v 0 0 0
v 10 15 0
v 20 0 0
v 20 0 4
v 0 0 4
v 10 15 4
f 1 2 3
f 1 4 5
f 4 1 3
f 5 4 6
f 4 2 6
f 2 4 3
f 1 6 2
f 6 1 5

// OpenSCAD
$fn = 50;

difference() {
	union() {
		linear_extrude(height = 4) {
			polygon(points = [[0, 0], [20, 0], [10, 15]]);
		}
	}
	union();
}
